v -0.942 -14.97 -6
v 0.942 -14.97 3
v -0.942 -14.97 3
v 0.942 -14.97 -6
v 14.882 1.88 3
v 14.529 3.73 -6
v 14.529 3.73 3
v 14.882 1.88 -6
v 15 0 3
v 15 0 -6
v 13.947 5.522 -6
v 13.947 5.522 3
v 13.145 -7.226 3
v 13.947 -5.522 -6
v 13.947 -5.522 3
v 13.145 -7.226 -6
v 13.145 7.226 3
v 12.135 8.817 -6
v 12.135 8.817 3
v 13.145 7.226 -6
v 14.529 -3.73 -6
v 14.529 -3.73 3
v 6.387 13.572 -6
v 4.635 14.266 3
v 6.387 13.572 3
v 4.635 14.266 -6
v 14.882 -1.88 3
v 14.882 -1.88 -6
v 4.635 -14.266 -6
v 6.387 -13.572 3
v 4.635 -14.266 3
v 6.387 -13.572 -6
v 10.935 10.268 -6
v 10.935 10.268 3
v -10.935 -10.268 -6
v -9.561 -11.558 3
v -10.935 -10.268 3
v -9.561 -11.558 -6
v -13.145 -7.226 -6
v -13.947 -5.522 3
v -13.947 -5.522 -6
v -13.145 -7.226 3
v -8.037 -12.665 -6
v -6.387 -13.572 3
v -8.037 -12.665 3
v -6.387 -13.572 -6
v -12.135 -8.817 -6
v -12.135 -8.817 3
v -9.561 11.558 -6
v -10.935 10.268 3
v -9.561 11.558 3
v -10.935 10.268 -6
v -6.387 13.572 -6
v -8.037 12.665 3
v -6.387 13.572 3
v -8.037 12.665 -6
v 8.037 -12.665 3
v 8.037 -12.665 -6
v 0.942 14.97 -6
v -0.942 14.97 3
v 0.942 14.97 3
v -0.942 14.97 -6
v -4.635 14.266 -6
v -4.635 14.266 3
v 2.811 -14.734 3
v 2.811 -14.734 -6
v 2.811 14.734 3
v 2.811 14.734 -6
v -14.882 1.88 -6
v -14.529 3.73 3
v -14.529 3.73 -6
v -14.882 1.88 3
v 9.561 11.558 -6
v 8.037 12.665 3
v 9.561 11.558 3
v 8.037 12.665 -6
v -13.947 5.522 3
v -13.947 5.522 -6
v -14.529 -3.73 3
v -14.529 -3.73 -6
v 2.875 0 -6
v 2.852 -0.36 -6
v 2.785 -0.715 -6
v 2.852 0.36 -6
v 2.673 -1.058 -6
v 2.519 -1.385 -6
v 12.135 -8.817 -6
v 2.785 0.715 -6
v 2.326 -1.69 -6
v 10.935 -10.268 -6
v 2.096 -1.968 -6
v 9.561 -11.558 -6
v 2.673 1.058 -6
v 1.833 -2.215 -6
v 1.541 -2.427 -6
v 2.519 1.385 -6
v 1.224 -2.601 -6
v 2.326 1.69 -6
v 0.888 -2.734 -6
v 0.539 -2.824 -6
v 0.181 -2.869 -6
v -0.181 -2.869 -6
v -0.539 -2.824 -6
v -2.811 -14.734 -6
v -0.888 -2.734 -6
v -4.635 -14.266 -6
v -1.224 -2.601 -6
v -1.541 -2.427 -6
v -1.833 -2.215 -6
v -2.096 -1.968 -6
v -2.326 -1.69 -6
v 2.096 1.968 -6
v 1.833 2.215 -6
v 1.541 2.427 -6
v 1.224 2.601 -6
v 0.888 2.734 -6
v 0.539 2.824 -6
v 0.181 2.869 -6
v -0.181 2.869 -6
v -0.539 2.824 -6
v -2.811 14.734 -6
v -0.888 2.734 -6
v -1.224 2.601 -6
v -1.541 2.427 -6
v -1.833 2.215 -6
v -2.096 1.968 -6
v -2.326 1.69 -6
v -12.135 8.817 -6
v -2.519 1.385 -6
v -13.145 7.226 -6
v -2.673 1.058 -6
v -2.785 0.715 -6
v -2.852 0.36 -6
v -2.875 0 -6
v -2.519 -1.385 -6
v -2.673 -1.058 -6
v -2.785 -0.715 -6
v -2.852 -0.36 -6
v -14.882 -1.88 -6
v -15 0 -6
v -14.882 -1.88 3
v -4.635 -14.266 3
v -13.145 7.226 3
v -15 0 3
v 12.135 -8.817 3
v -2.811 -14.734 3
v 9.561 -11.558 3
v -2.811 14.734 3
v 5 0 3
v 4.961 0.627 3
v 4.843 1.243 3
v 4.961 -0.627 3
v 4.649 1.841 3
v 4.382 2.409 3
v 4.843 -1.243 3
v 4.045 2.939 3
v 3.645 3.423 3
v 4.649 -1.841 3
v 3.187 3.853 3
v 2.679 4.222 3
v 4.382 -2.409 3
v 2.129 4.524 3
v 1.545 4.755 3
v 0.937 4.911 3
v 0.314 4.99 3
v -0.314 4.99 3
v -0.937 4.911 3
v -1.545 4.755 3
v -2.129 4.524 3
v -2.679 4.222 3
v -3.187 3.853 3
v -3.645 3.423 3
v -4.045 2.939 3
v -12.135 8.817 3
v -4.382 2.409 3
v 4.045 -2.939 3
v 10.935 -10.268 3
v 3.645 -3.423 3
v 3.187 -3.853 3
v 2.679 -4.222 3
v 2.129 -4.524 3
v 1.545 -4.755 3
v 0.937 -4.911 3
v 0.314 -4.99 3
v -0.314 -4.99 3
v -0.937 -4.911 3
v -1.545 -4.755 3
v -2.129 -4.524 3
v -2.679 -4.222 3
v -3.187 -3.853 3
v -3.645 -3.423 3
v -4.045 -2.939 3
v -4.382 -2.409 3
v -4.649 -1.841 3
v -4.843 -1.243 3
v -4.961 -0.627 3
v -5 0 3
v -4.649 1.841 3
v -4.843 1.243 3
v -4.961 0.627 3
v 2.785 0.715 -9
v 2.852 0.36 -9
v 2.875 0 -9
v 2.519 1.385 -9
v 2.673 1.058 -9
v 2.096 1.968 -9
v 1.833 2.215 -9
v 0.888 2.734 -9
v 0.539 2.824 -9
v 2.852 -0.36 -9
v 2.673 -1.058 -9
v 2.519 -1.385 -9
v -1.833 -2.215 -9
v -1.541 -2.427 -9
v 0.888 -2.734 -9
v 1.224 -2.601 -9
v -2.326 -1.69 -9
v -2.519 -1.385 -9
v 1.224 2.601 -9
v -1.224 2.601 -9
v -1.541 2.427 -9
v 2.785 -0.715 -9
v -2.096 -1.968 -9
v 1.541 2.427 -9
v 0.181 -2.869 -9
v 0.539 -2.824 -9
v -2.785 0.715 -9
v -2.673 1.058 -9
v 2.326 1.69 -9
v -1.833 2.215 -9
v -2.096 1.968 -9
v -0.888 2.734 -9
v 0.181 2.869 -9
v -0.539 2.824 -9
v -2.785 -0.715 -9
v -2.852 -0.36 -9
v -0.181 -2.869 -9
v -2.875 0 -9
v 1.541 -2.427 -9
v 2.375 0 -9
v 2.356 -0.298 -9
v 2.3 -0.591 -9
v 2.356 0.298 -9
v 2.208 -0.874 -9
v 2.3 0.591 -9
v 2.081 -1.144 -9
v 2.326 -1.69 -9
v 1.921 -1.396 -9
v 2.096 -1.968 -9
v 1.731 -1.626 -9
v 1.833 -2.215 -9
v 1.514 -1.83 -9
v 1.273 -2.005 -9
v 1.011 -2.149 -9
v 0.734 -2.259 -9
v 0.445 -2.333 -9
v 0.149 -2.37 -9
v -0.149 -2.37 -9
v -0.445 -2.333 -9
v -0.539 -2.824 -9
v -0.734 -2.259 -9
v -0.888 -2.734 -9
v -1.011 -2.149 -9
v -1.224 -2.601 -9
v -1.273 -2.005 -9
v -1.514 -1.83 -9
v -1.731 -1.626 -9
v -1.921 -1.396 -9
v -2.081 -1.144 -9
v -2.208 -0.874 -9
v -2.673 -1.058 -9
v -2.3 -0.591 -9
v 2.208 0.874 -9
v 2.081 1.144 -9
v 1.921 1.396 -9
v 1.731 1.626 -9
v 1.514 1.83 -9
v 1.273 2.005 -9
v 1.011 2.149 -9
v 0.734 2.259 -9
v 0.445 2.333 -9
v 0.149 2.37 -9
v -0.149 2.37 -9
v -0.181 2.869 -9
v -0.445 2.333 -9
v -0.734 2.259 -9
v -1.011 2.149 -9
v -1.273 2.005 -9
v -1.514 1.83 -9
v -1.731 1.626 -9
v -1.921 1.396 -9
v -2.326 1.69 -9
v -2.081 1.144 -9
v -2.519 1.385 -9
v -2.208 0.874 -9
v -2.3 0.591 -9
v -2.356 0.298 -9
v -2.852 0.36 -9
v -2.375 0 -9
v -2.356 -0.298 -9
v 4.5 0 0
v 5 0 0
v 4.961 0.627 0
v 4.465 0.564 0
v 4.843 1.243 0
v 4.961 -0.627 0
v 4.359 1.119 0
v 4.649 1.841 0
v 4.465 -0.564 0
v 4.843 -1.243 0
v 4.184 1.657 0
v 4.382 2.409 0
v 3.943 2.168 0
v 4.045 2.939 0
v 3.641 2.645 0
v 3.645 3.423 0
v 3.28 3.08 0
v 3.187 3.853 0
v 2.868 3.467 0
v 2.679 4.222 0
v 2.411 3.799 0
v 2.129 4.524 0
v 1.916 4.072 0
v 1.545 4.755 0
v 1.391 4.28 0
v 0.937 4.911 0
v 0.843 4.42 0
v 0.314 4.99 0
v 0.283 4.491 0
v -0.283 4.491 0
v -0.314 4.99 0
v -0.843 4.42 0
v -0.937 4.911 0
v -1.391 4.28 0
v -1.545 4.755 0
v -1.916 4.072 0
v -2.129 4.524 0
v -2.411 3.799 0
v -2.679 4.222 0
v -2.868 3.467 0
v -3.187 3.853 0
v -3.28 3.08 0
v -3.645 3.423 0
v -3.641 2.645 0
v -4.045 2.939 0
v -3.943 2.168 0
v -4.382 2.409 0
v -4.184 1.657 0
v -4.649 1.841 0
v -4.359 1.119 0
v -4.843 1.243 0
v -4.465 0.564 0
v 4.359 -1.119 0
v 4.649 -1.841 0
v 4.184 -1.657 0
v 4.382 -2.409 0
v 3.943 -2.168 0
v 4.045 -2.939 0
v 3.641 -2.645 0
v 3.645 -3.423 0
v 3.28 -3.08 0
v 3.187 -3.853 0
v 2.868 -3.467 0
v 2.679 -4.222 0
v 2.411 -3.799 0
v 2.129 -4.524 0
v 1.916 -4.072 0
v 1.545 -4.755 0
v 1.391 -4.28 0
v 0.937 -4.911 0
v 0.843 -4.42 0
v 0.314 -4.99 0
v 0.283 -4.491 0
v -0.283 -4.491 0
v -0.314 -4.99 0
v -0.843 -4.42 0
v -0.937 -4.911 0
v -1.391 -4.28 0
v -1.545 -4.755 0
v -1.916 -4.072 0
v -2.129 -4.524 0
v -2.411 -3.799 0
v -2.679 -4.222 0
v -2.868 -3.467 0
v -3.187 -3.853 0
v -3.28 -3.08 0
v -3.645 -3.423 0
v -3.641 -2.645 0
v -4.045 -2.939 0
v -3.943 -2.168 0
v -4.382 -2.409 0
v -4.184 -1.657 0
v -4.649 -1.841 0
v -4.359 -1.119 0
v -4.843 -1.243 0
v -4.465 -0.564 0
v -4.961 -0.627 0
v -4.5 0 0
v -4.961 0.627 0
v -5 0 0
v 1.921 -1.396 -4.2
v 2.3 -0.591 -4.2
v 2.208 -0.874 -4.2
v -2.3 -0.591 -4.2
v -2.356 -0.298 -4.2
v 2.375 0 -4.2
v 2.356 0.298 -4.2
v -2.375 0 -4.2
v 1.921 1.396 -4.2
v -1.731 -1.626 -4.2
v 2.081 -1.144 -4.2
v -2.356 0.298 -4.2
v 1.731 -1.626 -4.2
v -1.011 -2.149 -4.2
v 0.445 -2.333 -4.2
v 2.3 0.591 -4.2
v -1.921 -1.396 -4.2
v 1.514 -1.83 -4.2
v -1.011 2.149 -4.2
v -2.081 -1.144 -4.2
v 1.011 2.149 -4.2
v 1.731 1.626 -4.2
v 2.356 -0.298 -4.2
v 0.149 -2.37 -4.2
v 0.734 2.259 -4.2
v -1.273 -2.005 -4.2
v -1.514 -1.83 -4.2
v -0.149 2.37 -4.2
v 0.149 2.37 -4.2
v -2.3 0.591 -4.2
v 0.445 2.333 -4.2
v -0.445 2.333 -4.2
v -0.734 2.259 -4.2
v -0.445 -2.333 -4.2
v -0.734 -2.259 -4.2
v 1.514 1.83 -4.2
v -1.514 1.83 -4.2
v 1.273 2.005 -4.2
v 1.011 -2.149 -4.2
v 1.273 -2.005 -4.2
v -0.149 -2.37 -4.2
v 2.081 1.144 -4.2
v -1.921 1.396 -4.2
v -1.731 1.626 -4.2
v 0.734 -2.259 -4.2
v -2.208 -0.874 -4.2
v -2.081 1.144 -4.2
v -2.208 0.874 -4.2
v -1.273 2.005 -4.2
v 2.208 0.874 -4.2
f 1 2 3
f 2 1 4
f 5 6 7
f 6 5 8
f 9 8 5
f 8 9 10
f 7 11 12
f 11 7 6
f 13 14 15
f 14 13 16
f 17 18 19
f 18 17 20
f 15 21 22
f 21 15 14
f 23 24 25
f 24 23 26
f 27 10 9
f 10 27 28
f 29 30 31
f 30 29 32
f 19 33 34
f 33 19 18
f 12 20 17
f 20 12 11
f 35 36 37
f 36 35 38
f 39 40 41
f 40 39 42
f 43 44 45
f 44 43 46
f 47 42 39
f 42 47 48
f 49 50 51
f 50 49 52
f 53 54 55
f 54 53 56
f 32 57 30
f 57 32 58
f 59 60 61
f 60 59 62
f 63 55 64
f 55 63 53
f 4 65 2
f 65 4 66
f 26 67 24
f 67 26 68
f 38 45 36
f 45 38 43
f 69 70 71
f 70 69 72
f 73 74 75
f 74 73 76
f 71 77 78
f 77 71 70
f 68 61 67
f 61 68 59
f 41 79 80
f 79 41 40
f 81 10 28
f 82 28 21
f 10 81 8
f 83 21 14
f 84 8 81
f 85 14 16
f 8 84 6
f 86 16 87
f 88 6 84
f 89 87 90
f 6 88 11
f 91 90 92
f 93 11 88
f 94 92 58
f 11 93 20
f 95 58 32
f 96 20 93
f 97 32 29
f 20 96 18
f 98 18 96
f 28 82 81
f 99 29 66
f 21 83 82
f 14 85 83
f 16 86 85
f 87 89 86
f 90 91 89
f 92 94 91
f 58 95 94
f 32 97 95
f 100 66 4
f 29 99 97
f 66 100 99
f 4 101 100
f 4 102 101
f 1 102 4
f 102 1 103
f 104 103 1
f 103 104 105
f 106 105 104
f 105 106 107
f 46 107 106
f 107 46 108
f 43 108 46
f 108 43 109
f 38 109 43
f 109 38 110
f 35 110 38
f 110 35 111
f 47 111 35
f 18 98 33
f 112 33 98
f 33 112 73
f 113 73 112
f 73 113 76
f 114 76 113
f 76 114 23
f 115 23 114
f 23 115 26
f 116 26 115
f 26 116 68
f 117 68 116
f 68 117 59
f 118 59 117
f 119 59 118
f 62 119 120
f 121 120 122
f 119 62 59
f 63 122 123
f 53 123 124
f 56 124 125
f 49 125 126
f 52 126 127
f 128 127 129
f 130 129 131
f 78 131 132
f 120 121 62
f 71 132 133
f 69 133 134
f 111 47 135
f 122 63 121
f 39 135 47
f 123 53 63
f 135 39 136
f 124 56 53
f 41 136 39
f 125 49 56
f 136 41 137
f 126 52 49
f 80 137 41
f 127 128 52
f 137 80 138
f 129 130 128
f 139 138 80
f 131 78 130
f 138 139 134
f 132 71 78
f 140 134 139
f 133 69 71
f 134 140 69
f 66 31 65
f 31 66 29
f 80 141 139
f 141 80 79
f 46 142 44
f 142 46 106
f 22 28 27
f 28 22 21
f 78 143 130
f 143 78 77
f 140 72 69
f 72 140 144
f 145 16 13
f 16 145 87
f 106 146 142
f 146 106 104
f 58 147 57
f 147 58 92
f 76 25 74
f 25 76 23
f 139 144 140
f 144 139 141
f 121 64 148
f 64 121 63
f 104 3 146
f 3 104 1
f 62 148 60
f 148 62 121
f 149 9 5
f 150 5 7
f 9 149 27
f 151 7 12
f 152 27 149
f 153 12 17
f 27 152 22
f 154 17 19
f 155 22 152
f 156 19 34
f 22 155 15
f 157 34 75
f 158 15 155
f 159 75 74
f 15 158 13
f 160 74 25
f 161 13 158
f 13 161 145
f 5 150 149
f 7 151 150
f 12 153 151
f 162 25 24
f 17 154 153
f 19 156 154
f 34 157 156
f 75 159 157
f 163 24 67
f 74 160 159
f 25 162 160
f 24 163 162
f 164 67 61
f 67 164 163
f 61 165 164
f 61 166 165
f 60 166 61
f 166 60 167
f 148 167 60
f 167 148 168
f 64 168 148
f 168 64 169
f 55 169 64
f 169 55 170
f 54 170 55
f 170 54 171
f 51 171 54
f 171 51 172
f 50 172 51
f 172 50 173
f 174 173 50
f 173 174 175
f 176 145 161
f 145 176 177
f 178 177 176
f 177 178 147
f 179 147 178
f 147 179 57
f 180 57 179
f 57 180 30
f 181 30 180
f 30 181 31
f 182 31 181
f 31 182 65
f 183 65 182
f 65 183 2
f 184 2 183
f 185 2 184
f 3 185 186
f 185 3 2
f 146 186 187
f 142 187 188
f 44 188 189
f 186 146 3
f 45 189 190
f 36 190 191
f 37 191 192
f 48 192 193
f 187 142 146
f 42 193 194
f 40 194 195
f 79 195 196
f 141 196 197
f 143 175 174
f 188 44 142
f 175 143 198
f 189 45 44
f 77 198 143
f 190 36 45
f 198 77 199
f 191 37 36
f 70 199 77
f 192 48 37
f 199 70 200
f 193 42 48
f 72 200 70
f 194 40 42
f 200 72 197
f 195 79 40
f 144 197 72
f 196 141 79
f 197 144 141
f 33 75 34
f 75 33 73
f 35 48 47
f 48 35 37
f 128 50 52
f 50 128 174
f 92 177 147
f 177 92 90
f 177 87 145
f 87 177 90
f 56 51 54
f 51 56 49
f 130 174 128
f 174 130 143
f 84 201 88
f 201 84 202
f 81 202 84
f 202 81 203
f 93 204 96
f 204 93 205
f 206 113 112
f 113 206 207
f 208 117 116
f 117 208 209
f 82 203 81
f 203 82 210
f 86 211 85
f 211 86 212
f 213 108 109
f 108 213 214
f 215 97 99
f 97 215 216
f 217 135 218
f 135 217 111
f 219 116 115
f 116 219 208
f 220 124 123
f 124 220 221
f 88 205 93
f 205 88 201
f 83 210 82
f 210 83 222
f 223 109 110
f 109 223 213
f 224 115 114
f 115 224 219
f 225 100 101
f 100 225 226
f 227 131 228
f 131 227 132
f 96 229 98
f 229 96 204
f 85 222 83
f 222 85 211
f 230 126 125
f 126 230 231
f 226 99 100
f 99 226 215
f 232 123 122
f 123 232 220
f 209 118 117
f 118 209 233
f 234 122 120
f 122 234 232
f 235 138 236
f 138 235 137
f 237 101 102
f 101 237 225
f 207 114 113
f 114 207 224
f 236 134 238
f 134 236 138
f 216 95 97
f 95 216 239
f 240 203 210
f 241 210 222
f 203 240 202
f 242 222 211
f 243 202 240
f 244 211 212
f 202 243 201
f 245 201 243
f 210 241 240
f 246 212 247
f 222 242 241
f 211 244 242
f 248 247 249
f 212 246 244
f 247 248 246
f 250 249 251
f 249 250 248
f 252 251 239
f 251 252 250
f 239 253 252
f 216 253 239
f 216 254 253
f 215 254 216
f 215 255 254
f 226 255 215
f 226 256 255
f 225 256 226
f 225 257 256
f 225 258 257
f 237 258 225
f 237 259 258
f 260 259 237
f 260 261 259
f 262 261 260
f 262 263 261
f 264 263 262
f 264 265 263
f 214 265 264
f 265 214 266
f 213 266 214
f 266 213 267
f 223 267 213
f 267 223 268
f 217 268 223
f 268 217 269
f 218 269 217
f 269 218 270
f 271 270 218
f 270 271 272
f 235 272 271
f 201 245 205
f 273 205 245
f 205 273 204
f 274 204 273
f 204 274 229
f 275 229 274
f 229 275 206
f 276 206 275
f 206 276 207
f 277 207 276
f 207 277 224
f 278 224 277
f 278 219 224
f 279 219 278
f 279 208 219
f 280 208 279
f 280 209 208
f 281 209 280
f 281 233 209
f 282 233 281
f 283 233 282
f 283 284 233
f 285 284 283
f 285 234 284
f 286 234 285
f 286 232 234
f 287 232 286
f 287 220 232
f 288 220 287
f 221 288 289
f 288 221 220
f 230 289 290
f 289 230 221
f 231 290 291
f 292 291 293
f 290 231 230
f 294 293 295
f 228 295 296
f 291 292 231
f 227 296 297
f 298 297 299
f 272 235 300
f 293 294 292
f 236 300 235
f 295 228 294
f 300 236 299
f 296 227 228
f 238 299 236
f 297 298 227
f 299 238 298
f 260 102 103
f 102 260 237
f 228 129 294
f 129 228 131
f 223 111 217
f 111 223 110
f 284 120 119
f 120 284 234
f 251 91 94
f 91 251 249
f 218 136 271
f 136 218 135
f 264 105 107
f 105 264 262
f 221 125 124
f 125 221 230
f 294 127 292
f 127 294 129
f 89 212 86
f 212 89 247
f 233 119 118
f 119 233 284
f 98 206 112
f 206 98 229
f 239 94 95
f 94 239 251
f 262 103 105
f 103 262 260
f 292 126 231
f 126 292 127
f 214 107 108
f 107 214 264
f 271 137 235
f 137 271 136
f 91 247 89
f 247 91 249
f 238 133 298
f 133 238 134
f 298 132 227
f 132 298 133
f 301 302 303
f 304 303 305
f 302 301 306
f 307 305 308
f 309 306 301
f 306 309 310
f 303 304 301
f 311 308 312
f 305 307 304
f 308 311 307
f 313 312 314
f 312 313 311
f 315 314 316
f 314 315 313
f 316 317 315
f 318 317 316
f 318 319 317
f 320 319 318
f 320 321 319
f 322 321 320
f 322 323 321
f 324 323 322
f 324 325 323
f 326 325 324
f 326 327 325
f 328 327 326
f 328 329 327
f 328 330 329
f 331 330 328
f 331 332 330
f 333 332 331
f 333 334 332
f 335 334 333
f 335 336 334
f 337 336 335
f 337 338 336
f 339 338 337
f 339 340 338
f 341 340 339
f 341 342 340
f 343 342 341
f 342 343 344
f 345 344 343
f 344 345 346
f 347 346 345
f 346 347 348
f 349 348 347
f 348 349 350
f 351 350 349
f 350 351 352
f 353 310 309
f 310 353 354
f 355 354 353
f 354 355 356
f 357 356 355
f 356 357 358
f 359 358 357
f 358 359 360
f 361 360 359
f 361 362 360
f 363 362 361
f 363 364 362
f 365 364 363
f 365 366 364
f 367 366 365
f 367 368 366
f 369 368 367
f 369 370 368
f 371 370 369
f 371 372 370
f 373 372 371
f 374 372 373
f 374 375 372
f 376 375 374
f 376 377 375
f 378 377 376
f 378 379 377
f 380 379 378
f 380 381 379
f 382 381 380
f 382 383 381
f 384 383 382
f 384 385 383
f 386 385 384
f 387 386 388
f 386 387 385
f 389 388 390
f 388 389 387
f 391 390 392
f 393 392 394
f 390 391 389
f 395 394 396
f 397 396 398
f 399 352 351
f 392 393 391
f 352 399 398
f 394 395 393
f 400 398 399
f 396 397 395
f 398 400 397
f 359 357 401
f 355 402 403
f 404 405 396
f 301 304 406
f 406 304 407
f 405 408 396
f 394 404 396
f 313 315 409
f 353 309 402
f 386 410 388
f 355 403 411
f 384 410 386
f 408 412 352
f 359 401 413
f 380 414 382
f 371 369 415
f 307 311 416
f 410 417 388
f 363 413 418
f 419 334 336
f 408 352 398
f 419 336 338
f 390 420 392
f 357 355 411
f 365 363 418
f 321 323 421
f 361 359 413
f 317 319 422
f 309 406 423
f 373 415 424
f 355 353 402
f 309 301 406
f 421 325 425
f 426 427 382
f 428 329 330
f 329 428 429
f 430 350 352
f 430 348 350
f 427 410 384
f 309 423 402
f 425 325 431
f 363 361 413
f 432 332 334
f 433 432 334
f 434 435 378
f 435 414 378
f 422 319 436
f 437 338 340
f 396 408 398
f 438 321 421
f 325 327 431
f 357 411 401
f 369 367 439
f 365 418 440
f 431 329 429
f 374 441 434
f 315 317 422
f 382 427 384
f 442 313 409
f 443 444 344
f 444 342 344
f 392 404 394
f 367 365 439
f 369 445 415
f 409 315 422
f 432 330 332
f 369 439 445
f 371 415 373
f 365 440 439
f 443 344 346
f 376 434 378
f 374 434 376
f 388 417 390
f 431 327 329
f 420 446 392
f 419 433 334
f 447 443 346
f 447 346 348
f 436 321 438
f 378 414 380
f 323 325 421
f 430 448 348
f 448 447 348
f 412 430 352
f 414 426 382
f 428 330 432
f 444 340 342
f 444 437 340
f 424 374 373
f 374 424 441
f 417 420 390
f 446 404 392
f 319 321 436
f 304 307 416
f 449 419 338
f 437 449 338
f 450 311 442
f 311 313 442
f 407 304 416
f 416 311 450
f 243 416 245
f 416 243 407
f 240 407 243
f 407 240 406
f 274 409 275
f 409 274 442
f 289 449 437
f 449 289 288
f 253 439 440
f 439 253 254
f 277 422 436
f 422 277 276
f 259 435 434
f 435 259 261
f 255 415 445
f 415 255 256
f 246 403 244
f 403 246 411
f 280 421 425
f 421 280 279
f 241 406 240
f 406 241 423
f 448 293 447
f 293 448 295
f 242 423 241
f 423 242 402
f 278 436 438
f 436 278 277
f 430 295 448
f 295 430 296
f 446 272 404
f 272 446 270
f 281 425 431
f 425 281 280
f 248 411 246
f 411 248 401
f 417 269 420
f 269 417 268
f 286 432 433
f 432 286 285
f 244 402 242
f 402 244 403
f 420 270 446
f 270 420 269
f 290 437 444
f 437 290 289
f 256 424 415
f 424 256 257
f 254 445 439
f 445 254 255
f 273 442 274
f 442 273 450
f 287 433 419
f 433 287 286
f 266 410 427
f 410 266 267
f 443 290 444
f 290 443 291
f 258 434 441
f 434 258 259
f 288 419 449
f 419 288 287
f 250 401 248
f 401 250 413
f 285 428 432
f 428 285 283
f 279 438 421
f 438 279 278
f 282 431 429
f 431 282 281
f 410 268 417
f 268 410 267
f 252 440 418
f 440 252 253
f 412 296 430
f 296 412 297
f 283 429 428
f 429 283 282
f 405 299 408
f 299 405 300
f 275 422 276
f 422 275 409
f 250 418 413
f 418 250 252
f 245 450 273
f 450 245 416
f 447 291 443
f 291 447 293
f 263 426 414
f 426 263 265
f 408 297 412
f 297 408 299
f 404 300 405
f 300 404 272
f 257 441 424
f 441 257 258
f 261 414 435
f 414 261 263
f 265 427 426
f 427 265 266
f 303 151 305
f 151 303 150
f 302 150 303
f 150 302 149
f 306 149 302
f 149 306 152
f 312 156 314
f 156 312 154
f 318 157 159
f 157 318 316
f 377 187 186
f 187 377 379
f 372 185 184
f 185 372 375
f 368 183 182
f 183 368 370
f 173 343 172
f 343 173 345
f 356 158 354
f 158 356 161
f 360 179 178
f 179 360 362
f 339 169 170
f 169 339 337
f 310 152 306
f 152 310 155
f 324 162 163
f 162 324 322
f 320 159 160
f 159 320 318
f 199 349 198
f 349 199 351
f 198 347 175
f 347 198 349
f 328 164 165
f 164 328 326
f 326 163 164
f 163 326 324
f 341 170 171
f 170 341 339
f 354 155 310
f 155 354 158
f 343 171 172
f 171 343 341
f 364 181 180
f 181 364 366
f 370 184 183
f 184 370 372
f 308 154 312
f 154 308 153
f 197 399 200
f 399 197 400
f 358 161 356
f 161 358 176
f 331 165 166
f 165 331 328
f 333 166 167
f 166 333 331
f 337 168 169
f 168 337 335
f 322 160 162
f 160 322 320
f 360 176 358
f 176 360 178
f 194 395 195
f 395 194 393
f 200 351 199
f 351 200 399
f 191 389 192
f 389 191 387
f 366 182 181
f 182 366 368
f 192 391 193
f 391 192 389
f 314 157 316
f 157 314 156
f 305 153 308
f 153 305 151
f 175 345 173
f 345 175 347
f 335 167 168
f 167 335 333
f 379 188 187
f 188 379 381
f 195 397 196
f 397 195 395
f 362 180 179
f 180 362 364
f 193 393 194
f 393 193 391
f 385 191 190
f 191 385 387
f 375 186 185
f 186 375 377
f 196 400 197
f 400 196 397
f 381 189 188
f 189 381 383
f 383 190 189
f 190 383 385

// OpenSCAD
$fn = 50;


difference() {
	union() {
		translate(v = [0, 0, -6.0000000000]) {
			cylinder(h = 9, r = 15.0000000000);
		}
		#translate(v = [0, 0, -9.0000000000]) {
			cylinder(h = 9, r = 2.8750000000);
		}
	}
	union() {
		translate(v = [0, 0, 0]) {
			rotate(a = [0, 0, 0]) {
				difference() {
					union() {
						translate(v = [0, 0, -9.0000000000]) {
							cylinder(h = 9, r = 2.2500000000);
						}
						translate(v = [0, 0, -4.2000000000]) {
							cylinder(h = 4.2000000000, r1 = 2.3750000000, r2 = 4.5000000000);
						}
						translate(v = [0, 0, -9.0000000000]) {
							cylinder(h = 9, r = 2.3750000000);
						}
						translate(v = [0, 0, -9.0000000000]) {
							cylinder(h = 9, r = 2.2500000000);
						}
					}
					union();
				}
			}
		}
		#cylinder(h = 3, r = 5.0000000000);
	}
}
